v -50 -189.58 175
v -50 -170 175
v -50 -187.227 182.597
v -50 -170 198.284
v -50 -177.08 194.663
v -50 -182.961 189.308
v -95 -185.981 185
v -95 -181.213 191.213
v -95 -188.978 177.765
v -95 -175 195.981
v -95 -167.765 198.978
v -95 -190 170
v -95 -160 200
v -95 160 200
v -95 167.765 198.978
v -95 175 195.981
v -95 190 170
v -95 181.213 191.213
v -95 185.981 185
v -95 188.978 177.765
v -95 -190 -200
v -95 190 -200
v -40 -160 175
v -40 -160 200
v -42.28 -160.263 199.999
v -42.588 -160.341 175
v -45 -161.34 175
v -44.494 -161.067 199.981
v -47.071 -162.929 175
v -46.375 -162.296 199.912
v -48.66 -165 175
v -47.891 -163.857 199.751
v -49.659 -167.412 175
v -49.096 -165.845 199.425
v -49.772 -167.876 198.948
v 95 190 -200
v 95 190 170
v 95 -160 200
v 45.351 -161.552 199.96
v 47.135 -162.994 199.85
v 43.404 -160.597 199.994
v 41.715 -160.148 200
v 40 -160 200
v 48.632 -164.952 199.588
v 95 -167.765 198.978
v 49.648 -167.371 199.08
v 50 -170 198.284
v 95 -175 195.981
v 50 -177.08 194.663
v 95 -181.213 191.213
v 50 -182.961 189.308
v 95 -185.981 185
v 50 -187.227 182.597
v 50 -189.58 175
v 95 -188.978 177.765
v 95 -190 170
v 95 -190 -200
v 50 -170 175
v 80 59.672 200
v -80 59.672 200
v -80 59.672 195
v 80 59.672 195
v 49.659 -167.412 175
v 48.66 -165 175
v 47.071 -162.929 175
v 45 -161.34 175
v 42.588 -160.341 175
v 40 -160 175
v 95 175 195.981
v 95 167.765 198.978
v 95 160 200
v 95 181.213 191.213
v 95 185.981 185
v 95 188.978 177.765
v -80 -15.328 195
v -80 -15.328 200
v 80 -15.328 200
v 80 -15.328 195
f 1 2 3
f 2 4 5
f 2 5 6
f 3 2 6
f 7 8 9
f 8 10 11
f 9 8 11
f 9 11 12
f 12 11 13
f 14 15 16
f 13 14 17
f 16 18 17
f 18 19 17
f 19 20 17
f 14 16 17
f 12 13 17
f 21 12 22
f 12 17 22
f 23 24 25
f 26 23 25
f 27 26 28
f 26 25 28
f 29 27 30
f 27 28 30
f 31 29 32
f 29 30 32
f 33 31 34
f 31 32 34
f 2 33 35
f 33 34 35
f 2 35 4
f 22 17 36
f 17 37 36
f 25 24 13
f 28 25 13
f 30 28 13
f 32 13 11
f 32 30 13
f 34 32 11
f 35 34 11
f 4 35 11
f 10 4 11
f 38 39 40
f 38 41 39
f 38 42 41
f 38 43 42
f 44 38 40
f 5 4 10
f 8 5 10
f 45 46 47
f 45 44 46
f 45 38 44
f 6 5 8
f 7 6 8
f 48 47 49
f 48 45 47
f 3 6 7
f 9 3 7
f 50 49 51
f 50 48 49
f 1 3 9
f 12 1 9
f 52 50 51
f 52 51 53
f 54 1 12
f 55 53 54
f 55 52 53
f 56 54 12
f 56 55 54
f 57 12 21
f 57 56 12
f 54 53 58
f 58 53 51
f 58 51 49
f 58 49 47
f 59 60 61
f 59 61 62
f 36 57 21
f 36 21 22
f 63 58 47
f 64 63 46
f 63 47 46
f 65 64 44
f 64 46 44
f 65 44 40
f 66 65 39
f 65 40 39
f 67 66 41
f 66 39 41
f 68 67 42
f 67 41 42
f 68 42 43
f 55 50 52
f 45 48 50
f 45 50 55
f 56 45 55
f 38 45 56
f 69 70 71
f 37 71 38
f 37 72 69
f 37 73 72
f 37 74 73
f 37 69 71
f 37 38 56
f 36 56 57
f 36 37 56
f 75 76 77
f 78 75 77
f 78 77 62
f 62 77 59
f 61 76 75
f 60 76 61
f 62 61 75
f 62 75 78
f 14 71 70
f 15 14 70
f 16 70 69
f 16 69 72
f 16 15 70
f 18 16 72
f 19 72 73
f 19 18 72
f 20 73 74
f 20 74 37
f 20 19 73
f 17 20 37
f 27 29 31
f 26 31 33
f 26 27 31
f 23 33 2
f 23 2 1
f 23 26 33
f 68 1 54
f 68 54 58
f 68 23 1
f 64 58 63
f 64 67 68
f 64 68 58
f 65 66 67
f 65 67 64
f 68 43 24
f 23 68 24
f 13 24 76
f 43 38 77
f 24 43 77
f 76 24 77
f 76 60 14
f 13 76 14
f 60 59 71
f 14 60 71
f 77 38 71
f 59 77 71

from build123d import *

# Parameters (mm, degrees)
CROQUIS1_W              = 400
CROQUIS1_H              = 380
SALIENTE_EXTRUIR1_DEPTH = 95
REDONDEO1_R             = 30
CROQUIS2_W              = 160
CROQUIS2_H              = 75
CORTAR_EXTRUIR1_DEPTH   = 5
CORTAR_EXTRUIR2_DEPTH   = 25


with BuildPart() as part:
    # Croquis1 → Saliente-Extruir1 (new body, symmetric)
    with BuildSketch(Plane(origin=(0, 0, 0), x_dir=(0, 0, -1), z_dir=(1, 0, 0))):
        Rectangle(CROQUIS1_W, CROQUIS1_H)
    extrude(amount=SALIENTE_EXTRUIR1_DEPTH, both=True)

    # Redondeo1
    redondeo1_edges = [part.edges().sort_by_distance(p)[0] for p in [
        (0, 190, 200),
        (0, -190, 200),
    ]]
    fillet(redondeo1_edges, radius=REDONDEO1_R)

    # Croquis2 → Cortar-Extruir1 (cut)
    with BuildSketch(Plane.XY.offset(200)):
        with Locations((0, 22.171988643)):
            Rectangle(CROQUIS2_W, CROQUIS2_H)
    extrude(amount=-CORTAR_EXTRUIR1_DEPTH, mode=Mode.SUBTRACT)

    # Croquis3 → Cortar-Extruir2 (cut)
    with BuildSketch(Plane.XY.offset(200)):
        with BuildLine():
            Line((40, -160), (-40, -160))
            ThreePointArc((-40, -160), (-47.071067812, -162.928932188), (-50, -170))
            Line((-50, -170), (-50, -190))
            Line((-50, -190), (50, -190))
            Line((50, -190), (50, -170))
            ThreePointArc((50, -170), (47.071067812, -162.928932188), (40, -160))
        make_face()
    extrude(amount=-CORTAR_EXTRUIR2_DEPTH, mode=Mode.SUBTRACT)


solid = part.part
